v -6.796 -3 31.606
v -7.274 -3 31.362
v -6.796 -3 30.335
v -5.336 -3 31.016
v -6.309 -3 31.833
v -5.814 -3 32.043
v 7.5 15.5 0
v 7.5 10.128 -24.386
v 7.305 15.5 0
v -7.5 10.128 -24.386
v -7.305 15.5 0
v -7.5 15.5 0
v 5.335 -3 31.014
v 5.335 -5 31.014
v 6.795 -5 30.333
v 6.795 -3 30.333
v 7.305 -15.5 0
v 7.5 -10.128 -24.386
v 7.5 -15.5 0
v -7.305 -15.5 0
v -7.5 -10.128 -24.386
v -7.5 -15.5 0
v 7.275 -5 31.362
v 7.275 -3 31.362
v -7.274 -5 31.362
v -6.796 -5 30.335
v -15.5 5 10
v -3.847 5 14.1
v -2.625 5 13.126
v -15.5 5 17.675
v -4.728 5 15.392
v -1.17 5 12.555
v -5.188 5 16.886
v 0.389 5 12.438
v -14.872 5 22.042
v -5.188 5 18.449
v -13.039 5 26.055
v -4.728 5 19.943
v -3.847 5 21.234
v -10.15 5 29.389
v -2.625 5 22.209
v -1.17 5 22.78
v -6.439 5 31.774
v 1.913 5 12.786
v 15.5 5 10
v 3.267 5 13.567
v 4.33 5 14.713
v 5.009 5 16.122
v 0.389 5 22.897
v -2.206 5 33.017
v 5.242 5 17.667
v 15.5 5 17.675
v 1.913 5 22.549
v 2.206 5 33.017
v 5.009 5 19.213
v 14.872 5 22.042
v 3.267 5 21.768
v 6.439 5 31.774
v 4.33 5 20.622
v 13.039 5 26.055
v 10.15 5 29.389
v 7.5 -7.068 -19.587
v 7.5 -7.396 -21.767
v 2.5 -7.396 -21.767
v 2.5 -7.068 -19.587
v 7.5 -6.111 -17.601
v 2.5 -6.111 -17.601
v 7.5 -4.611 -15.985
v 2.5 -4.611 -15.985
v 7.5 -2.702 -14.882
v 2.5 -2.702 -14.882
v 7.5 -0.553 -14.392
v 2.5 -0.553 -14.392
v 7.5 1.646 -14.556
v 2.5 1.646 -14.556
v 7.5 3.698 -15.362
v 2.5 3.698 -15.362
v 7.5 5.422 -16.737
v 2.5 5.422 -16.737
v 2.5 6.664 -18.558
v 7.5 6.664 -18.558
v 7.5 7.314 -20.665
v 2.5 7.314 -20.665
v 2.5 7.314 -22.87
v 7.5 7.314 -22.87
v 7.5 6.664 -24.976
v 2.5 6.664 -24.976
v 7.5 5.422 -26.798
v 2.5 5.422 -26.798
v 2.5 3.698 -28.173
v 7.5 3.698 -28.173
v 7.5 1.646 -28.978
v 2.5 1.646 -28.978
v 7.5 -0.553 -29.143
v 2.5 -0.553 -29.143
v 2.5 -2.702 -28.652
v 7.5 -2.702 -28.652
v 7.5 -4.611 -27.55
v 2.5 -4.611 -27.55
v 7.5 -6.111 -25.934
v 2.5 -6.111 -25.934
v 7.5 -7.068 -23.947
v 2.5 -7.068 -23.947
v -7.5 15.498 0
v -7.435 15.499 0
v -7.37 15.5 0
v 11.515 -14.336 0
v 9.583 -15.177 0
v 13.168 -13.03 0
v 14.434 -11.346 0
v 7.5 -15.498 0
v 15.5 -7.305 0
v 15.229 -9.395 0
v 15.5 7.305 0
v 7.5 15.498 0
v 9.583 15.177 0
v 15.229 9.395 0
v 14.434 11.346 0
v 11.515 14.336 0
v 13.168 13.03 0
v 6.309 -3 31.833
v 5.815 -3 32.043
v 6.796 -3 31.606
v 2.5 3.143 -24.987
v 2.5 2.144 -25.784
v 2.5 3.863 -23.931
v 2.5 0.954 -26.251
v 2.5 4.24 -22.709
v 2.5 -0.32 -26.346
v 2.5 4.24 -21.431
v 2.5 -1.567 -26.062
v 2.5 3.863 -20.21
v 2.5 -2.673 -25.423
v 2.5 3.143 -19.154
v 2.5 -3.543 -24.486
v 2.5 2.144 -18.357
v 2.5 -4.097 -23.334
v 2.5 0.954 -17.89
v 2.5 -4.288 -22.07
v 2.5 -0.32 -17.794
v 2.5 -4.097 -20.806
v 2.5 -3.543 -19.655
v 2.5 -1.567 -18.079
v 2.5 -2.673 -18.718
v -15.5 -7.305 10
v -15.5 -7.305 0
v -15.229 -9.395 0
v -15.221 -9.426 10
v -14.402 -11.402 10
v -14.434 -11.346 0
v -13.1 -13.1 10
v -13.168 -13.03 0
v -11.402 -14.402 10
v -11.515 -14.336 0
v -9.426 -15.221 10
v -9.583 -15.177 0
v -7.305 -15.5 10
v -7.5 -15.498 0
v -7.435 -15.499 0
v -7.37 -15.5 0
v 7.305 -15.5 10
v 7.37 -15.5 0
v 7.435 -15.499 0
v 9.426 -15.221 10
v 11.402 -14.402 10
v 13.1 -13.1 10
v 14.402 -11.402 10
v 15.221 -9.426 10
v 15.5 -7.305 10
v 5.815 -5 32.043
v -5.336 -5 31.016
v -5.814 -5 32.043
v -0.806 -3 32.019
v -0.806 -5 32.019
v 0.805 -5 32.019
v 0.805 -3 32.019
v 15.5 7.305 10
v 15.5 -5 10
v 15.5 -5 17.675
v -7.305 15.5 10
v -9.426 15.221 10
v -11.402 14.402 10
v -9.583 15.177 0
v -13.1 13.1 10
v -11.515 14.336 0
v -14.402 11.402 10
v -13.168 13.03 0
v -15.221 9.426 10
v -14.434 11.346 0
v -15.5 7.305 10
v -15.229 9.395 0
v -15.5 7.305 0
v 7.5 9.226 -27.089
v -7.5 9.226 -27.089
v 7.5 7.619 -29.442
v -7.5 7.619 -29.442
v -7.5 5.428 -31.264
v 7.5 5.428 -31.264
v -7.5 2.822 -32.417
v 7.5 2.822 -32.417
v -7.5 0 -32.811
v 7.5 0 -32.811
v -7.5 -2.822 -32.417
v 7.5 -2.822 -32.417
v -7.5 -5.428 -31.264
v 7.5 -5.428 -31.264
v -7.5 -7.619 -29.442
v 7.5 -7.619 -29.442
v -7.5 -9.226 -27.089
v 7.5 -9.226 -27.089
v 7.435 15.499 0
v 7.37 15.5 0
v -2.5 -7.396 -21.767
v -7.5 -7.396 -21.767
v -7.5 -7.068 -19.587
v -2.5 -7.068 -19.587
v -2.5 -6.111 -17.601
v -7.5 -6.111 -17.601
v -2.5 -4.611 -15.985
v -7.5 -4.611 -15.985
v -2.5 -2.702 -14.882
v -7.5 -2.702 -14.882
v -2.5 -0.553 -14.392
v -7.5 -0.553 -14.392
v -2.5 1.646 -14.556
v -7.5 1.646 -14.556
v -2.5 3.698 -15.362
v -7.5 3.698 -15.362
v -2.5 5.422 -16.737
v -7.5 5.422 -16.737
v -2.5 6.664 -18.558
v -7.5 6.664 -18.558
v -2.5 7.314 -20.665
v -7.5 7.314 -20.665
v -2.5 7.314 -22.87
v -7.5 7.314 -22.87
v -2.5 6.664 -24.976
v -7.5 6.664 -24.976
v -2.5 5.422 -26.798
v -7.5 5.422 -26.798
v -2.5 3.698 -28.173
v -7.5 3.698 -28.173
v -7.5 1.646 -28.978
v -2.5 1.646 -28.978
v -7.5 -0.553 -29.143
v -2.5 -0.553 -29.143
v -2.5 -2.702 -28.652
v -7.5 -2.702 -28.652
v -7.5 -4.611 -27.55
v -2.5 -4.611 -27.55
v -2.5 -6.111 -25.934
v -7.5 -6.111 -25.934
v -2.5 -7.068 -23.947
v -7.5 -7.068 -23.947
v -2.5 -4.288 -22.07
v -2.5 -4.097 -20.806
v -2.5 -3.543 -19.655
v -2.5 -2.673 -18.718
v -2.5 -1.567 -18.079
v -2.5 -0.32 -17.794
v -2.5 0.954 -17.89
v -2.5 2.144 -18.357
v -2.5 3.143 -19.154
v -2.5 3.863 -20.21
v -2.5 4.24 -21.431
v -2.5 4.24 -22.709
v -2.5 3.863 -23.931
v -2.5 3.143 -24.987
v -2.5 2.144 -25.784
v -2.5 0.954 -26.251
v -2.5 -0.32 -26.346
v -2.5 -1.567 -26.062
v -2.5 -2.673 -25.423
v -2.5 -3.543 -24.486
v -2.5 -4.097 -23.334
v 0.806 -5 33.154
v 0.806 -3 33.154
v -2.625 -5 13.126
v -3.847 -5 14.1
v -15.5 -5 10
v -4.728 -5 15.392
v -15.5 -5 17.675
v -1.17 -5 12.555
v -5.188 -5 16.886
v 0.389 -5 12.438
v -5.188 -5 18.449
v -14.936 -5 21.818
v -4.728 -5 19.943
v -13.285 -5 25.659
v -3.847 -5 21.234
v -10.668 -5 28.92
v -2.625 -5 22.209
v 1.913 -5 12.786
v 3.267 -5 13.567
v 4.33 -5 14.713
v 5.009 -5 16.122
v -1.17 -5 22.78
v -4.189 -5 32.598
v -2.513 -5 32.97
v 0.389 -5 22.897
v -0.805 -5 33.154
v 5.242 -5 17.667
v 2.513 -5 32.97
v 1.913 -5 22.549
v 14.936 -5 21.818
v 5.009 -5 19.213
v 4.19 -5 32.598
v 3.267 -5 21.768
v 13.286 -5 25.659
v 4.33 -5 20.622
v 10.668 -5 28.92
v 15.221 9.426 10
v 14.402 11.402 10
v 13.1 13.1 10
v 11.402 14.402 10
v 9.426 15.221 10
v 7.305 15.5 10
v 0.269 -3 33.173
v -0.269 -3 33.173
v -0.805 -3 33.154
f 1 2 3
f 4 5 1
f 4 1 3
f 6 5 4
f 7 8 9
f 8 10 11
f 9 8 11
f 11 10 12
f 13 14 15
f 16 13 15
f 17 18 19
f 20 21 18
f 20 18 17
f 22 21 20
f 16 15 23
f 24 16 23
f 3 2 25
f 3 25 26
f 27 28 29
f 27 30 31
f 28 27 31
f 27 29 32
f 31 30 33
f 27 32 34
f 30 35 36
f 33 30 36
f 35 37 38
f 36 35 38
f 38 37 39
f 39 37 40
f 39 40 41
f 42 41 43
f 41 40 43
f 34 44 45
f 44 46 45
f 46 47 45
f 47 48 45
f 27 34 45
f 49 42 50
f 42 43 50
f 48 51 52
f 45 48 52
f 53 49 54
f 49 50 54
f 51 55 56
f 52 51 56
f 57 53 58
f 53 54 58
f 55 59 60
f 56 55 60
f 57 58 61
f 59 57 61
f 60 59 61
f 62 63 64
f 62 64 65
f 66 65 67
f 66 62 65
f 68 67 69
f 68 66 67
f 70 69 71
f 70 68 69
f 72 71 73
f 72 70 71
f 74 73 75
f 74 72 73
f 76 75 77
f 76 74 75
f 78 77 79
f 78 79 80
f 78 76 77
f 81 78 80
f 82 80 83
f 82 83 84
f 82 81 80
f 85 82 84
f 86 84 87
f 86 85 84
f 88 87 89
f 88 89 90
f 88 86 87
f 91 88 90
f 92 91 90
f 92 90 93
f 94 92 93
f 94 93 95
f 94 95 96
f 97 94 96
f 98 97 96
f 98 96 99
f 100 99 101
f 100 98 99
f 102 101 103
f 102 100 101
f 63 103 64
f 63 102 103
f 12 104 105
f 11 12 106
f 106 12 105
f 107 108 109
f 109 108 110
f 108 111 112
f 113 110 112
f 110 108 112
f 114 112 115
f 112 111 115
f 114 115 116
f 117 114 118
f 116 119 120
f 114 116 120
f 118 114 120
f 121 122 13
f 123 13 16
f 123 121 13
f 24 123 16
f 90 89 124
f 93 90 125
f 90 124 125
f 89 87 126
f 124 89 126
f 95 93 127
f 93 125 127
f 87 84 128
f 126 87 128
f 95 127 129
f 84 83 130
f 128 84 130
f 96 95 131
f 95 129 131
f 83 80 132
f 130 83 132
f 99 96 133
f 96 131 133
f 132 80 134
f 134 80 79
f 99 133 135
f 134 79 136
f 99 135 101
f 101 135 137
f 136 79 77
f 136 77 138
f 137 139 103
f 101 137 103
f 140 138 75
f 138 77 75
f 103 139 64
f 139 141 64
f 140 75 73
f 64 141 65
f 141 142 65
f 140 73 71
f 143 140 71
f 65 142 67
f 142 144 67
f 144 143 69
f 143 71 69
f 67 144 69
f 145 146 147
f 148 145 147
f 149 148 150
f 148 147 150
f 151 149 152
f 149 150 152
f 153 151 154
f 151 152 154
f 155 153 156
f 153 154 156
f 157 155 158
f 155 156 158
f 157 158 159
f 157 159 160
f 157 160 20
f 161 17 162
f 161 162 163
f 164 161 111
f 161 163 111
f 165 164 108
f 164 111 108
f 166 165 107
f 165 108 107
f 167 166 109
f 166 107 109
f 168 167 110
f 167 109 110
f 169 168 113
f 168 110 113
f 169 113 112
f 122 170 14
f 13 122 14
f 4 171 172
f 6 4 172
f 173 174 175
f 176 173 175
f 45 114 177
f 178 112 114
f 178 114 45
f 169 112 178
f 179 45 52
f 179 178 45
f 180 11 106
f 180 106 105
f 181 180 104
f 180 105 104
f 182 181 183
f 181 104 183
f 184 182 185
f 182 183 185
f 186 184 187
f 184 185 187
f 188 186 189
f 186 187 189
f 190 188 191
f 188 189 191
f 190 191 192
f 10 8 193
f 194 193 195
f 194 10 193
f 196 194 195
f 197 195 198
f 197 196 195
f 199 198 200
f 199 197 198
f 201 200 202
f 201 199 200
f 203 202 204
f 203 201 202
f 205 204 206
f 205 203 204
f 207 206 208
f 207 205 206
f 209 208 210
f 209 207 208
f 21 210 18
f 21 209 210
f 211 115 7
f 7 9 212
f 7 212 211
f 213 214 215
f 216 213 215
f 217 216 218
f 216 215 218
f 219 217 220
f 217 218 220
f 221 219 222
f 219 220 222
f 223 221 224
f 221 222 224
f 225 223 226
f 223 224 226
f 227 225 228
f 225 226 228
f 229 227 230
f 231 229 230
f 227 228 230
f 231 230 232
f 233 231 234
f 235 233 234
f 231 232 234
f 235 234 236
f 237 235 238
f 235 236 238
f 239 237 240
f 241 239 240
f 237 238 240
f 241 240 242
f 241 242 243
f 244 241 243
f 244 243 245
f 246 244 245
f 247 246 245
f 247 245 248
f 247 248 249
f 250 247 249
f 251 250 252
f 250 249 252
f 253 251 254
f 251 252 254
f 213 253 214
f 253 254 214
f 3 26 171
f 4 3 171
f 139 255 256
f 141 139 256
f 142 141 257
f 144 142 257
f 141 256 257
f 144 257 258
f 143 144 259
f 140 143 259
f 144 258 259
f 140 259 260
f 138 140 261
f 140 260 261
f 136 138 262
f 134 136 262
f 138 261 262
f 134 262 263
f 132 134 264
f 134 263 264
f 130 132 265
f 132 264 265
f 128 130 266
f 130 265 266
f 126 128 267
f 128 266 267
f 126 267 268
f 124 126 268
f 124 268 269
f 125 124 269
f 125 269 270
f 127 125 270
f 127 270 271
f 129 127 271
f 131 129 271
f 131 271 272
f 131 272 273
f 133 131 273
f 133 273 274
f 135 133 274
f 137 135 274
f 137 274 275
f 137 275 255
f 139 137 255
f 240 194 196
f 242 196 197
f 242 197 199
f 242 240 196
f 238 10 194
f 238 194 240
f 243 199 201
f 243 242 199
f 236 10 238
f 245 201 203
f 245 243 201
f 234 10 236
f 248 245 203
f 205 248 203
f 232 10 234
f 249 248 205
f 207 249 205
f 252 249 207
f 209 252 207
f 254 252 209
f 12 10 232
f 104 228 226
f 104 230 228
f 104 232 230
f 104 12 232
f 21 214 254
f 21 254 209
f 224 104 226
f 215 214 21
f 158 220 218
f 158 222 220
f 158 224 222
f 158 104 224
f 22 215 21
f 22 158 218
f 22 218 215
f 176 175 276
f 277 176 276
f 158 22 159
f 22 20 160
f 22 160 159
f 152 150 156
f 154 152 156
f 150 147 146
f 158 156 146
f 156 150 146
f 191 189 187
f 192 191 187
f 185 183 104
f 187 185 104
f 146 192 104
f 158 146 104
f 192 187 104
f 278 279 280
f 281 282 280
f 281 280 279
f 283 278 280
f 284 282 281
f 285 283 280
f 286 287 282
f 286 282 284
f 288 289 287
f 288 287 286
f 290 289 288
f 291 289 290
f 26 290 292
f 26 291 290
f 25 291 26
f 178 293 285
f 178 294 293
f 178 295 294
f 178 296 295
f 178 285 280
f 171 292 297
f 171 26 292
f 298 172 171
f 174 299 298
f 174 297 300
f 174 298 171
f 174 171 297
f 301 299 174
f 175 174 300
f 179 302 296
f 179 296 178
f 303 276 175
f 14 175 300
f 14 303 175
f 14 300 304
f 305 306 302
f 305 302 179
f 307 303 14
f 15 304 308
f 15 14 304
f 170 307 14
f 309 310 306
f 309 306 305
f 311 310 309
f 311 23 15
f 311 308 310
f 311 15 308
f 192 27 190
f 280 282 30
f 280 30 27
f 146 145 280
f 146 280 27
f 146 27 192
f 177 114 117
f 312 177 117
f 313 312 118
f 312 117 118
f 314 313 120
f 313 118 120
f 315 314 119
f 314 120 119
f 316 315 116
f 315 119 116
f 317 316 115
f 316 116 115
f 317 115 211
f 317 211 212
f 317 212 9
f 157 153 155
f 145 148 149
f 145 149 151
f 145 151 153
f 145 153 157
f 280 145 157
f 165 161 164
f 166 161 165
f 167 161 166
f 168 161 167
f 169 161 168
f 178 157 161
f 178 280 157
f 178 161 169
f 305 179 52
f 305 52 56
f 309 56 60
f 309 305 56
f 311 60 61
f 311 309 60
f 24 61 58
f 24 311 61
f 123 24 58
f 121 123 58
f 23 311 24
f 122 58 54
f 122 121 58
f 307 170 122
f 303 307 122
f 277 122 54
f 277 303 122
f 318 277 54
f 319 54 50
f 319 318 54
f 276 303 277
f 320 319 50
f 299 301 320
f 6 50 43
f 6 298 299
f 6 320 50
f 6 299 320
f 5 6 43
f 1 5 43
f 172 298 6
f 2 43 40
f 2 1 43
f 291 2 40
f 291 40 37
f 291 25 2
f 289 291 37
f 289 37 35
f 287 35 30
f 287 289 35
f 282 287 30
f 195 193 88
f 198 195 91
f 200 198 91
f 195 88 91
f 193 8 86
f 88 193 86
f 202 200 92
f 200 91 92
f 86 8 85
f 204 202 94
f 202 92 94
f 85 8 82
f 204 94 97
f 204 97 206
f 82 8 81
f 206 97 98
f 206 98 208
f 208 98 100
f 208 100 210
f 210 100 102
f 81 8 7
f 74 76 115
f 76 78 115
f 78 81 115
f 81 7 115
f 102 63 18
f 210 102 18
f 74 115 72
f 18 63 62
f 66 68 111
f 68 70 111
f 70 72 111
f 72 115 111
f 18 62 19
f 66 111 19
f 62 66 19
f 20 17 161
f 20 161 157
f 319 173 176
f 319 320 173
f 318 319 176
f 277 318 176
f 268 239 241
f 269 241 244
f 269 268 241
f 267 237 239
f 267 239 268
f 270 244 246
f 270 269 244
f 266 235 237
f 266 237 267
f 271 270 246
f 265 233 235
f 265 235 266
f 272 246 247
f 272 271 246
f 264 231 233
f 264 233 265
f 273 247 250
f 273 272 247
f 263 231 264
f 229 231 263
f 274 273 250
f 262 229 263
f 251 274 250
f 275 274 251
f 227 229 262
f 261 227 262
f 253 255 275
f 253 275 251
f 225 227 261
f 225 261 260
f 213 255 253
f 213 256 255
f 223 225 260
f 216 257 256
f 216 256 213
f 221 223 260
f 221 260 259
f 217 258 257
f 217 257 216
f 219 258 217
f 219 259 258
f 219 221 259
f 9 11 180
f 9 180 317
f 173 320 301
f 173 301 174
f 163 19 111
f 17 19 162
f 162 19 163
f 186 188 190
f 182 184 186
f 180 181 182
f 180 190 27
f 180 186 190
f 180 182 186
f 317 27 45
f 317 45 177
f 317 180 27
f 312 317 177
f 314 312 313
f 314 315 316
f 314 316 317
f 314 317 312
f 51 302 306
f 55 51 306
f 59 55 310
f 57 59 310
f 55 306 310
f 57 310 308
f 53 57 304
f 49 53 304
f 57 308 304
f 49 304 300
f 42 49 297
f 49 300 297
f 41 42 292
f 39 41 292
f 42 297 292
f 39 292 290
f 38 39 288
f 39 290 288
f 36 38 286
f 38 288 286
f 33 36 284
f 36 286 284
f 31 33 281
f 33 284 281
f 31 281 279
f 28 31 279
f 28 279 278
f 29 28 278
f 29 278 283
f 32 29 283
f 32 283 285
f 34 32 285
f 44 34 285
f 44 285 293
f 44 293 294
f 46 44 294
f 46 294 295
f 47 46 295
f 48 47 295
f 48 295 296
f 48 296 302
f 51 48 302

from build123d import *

# Parameters (mm, degrees)
PAD_DEPTH         = 10
PAD001_DEPTH      = 5
SKETCH002_W       = 60.350427
SKETCH002_H       = 42.441708
POCKET_DEPTH      = 15.501
POCKET_DEPTH_BACK = -15.501
PAD002_DEPTH      = 7.5
SKETCH004_R       = 7.396265
POCKET001_DEPTH   = 5
SKETCH005_R       = 4.287868
POCKET002_DEPTH   = 18.001
SKETCH006_R       = 7.396265
POCKET003_DEPTH   = 5
POCKET004_DEPTH   = 2
SKETCH008_R       = 5.244286
POCKET005_DEPTH   = 18


with BuildPart() as part:
    # Sketch → Pad (new body)
    with BuildSketch(Plane.XY):
        with BuildLine():
            ThreePointArc((-7.304893, 15.5), (-13.099709, 13.099709), (-15.5, 7.304893))
            Line((-15.5, -7.304893), (-15.5, 7.304893))
            ThreePointArc((-15.5, -7.304893), (-13.099709, -13.099709), (-7.304893, -15.5))
            Line((7.304893, -15.5), (-7.304893, -15.5))
            ThreePointArc((7.304893, -15.5), (13.099709, -13.099709), (15.5, -7.304893))
            Line((15.5, 7.304893), (15.5, -7.304893))
            ThreePointArc((15.5, 7.304893), (13.099709, 13.099709), (7.304893, 15.5))
            Line((-7.304893, 15.5), (7.304893, 15.5))
        make_face()
    extrude(amount=PAD_DEPTH)

    # Sketch001 (on Face4 of Pad) → Pad001 (join, symmetric)
    with BuildSketch(Plane.XZ):
        with BuildLine():
            ThreePointArc((15.5, 17.675132), (0, 33.175132), (-15.5, 17.675132))
            Line((-15.5, 17.675132), (-15.5, -25.955341))
            ThreePointArc((-15.5, -25.955341), (0, -41.455341), (15.5, -25.955341))
            Line((15.5, -25.955341), (15.5, 17.675132))
        make_face()
    extrude(amount=PAD001_DEPTH, both=True)

    # Sketch002 → Pocket (cut, two sides)
    with BuildSketch(Plane.XZ) as pocket_sk:
        with Locations((0.02109, -21.220854)):
            Rectangle(SKETCH002_W, SKETCH002_H)
    extrude(amount=-POCKET_DEPTH, mode=Mode.SUBTRACT)
    extrude(pocket_sk.sketch, amount=-POCKET_DEPTH_BACK, mode=Mode.SUBTRACT)

    # Sketch003 (on Face7 of Pocket) → Pad002 (join, symmetric)
    with BuildSketch(Plane(origin=(0, 0, 0), x_dir=(0, -1, 0), z_dir=(-1, 0, 0))):
        with BuildLine():
            ThreePointArc((-10.127765, -24.385975), (0, -32.810989), (10.127765, -24.385975))
            Line((10.127765, -24.385975), (15.5, 0))
            Line((15.5, 0), (-15.5, 0))
            Line((-10.127765, -24.385975), (-15.5, 0))
        make_face()
    extrude(amount=PAD002_DEPTH, both=True)

    # Sketch004 (on Face10 of Pad002) → Pocket001 (cut)
    with BuildSketch(Plane(origin=(-7.5, 0, 0), x_dir=(0, -1, 0), z_dir=(-1, 0, 0))):
        with Locations((0, -21.767319)):
            Circle(SKETCH004_R)
    extrude(amount=-POCKET001_DEPTH, mode=Mode.SUBTRACT)

    # Sketch005 (on Face34 of Pocket001) → Pocket002 (cut, through all)
    with BuildSketch(Plane(origin=(-2.5, 0, 0), x_dir=(0, -1, 0), z_dir=(-1, 0, 0))):
        with Locations((0, -22.070341)):
            Circle(SKETCH005_R)
    extrude(amount=-POCKET002_DEPTH, mode=Mode.SUBTRACT)

    # Sketch006 (on Face10 of Pad002) → Pocket003 (cut)
    with BuildSketch(Plane(origin=(7.5, 0, 0), x_dir=(0, -1, 0), z_dir=(-1, 0, 0))):
        with Locations((0, -21.767319)):
            Circle(SKETCH006_R)
    extrude(amount=POCKET003_DEPTH, mode=Mode.SUBTRACT)

    # Sketch007 (on Face31 of Pocket003) → Pocket004 (cut)
    with BuildSketch(Plane.XZ.offset(5)):
        Polygon((-6.795665, 30.335199), (-5.335589, 31.015743), (-6.016133, 32.47582), (-7.476209, 31.795276), align=None)
        Polygon((0.805308, 32.018946), (0.805581, 33.629835), (-0.805308, 33.630107), (-0.805581, 32.019218), align=None)
        Polygon((6.794823, 30.3329), (7.475861, 31.792746), (6.016015, 32.473784), (5.334977, 31.013938), align=None)
    extrude(amount=-POCKET004_DEPTH, mode=Mode.SUBTRACT)

    # Sketch008 (on Face31 of Pocket003) → Pocket005 (cut)
    with BuildSketch(Plane.XZ.offset(5)):
        with Locations((-0.002564, 17.667446)):
            Circle(SKETCH008_R)
    extrude(amount=-POCKET005_DEPTH, mode=Mode.SUBTRACT)


solid = part.part
